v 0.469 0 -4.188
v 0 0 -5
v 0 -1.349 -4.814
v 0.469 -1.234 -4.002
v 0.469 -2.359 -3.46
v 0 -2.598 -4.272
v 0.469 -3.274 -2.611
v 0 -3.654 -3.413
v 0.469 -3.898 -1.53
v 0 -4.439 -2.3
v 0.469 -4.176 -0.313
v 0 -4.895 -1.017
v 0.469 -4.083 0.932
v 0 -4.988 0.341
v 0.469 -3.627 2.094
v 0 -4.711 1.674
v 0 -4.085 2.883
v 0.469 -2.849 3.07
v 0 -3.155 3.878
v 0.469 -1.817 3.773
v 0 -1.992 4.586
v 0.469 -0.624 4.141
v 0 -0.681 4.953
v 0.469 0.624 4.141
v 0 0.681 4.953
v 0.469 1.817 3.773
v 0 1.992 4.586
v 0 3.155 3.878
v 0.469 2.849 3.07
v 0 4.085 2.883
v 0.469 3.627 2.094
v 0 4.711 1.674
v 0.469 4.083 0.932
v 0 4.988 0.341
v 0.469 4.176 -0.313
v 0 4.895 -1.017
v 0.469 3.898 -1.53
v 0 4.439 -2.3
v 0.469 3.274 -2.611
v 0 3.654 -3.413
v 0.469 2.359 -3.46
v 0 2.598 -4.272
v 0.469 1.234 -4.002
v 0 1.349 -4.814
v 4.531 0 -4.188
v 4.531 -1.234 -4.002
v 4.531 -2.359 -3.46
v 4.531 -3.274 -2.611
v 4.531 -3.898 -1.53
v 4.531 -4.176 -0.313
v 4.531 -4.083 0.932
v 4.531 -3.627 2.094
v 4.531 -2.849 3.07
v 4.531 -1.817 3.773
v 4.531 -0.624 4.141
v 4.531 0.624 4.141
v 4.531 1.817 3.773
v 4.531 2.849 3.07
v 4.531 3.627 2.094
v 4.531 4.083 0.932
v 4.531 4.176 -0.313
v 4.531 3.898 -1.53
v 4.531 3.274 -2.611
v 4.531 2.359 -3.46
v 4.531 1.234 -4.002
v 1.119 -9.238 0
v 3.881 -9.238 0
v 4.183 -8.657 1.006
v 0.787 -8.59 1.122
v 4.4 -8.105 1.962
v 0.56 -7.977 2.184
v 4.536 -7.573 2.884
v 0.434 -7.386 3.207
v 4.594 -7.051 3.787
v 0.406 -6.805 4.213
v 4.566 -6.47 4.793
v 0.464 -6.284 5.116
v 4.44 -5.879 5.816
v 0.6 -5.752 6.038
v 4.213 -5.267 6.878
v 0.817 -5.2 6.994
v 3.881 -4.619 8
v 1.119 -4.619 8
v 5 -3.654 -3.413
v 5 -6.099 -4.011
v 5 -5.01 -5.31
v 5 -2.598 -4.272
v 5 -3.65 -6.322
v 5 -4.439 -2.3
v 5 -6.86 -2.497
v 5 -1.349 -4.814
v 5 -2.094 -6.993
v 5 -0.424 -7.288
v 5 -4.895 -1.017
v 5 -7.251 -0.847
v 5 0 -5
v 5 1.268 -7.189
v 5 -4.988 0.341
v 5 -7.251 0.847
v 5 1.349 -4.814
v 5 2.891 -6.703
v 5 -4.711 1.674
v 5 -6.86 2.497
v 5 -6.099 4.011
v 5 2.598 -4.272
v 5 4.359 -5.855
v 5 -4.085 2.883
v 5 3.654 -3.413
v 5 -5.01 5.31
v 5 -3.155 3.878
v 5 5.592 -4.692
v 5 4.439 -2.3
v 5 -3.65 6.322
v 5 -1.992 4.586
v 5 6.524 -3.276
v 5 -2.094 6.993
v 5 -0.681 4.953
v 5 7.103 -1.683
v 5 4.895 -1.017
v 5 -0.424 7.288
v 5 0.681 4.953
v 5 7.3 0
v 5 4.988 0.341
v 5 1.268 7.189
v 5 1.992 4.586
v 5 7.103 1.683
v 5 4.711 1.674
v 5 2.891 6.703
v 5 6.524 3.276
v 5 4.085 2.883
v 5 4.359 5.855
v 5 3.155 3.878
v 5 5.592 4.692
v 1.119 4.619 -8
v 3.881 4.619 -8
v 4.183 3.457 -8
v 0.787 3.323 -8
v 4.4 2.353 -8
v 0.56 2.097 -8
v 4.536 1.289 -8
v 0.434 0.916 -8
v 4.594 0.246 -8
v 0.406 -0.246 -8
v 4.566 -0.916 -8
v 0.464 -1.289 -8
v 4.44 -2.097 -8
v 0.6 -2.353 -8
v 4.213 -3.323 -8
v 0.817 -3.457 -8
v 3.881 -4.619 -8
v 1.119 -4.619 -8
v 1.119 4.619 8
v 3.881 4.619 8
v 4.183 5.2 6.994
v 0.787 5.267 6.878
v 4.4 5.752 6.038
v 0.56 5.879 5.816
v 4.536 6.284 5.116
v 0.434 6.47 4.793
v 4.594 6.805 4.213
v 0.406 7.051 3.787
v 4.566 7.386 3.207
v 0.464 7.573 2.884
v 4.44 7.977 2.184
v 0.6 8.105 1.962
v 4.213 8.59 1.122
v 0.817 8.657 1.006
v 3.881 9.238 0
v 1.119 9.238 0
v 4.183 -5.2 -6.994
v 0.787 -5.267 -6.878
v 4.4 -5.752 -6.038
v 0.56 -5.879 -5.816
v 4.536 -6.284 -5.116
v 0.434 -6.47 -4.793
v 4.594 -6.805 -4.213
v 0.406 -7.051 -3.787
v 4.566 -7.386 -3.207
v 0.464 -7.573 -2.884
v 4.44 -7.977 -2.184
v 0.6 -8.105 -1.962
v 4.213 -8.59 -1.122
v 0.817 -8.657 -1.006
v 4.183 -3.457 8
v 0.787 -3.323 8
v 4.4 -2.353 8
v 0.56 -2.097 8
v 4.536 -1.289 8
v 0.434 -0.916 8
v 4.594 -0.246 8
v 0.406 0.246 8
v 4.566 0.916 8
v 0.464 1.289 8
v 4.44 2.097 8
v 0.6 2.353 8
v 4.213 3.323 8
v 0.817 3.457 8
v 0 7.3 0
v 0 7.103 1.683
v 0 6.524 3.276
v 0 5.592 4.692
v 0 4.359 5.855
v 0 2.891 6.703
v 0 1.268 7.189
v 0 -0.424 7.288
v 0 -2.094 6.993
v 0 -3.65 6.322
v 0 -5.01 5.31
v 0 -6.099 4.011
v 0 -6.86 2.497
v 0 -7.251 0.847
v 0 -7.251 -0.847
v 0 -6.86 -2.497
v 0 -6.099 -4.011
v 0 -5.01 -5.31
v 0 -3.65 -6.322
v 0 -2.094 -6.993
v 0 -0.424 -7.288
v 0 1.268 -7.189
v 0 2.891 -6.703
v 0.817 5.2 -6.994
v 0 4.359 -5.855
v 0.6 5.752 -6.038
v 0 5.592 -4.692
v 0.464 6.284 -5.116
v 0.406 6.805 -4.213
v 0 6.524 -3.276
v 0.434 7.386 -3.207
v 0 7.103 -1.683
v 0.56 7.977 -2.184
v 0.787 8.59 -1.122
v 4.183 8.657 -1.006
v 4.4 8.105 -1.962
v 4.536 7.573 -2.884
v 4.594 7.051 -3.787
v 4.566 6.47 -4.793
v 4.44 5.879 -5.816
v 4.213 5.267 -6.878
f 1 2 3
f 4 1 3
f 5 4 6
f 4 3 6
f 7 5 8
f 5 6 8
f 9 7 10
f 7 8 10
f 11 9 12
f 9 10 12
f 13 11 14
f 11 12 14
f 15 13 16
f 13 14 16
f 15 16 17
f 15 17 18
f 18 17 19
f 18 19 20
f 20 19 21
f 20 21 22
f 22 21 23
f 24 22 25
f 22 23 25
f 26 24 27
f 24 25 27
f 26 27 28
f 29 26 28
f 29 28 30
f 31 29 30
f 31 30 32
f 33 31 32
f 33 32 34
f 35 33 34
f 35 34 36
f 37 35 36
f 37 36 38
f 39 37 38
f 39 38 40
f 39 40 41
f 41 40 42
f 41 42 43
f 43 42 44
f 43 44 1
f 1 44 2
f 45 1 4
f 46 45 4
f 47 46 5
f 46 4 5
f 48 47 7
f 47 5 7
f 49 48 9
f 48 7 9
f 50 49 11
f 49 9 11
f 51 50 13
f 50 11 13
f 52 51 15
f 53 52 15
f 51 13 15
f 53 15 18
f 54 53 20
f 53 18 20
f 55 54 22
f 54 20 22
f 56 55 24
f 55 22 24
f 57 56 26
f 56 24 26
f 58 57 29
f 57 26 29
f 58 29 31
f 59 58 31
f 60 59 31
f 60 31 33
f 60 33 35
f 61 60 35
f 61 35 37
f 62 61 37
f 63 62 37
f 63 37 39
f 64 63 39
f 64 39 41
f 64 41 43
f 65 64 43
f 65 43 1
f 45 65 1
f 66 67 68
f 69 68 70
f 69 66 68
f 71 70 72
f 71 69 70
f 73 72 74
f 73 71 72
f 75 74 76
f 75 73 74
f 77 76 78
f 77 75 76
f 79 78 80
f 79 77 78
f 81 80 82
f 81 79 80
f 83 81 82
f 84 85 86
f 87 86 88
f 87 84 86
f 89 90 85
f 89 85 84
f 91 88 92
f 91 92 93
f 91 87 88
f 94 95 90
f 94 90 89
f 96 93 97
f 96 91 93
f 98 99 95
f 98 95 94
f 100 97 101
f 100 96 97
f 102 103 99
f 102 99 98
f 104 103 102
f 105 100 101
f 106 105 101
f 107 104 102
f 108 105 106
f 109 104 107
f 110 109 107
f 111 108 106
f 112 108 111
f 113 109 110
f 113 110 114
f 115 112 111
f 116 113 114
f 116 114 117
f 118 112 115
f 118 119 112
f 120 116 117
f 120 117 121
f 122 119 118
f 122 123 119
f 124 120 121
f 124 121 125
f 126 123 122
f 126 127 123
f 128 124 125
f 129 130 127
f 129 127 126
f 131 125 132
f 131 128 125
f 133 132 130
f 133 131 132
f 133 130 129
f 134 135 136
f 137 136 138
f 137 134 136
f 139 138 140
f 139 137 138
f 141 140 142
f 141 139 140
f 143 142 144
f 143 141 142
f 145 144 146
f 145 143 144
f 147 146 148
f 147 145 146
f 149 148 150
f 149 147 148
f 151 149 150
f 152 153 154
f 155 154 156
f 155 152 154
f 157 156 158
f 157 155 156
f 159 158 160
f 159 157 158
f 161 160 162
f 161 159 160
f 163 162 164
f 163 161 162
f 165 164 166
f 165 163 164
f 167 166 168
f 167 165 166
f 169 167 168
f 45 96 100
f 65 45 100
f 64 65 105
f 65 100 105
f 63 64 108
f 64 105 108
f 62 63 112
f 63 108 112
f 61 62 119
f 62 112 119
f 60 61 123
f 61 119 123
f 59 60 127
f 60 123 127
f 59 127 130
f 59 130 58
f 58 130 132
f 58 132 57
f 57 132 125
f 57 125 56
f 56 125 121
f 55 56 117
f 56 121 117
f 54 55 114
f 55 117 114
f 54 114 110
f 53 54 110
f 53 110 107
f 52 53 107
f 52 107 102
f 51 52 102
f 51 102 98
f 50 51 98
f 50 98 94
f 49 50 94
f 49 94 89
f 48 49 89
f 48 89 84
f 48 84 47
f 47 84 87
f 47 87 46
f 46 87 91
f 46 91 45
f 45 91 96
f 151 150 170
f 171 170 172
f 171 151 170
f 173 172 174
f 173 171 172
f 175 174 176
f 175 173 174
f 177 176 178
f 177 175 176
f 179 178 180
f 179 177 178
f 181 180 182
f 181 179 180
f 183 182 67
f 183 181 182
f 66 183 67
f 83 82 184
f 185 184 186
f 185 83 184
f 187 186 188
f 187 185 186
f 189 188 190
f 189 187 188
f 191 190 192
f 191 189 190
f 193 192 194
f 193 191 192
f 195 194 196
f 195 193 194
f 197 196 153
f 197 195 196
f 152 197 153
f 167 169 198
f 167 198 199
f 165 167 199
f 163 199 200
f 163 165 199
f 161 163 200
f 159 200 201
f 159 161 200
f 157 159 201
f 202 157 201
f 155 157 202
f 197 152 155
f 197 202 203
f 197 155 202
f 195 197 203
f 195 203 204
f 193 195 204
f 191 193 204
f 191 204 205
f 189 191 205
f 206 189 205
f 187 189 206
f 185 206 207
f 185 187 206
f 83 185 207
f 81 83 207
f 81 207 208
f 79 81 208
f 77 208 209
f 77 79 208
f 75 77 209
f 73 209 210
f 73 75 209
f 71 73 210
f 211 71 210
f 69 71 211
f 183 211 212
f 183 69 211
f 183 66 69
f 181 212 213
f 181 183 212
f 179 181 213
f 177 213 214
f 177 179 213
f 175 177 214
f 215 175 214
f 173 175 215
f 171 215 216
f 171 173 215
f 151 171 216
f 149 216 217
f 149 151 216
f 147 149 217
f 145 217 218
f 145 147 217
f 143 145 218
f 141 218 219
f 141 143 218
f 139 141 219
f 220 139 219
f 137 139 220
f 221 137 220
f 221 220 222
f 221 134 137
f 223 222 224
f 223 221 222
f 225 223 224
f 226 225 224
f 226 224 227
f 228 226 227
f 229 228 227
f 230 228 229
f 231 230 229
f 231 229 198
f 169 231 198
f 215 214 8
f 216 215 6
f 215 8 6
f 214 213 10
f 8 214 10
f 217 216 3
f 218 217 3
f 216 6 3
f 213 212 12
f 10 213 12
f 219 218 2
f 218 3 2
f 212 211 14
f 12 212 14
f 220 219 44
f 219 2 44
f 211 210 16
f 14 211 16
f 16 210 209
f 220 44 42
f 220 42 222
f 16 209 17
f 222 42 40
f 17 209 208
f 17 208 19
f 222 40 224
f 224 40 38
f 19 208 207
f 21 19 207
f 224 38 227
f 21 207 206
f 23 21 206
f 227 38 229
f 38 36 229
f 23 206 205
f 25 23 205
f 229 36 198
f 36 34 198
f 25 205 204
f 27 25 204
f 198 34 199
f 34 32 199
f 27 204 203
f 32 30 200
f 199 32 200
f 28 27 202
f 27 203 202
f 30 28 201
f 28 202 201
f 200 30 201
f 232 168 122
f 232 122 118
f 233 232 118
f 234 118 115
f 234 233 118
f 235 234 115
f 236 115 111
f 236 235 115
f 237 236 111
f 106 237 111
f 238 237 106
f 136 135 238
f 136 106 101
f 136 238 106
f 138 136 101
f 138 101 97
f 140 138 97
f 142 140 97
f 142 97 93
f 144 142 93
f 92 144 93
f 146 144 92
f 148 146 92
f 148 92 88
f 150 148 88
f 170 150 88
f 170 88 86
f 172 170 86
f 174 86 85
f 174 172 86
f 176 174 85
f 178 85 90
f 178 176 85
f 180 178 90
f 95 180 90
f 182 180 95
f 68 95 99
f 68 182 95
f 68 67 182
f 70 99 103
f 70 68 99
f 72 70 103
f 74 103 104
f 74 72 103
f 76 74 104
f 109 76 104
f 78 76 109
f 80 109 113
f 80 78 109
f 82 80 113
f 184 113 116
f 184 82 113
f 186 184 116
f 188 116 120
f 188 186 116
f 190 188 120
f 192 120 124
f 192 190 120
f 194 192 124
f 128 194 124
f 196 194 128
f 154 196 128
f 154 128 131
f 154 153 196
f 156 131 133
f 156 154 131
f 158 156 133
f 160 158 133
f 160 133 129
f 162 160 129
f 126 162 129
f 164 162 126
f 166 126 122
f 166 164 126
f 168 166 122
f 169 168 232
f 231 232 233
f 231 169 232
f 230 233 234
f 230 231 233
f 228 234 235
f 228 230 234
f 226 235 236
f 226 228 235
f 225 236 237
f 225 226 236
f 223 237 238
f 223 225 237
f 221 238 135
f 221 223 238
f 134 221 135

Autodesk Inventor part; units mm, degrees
ref_plane "YZ Plane" through (0, 0, 0) normal (1, 0, 0) x (0, 1, 0)
ref_plane "XZ Plane" through (0, 0, 0) normal (0, 1, 0) x (-1, 0, 0)
sketch "Sketch1" plane through (0, 0, 0) normal (1, 0, 0) x (0, 1, 0)
  line L0 (-9.2376, 0) -> (-4.6188, 8)
  line L1 (-4.6188, 8) -> (4.6188, 8)
  line L2 (4.6188, 8) -> (9.2376, 0)
  line L3 (9.2376, 0) -> (4.6188, -8)
  line L4 (4.6188, -8) -> (-4.6188, -8)
  line L5 (-4.6188, -8) -> (-9.2376, 0)
  point P0 (0, 0)
  point P1 (0, 0)
  dimension "d0" = 18.4752
extrude "Body" add sketch "Sketch1" along normal blind 5
sketch "Sketch2" plane through (0, 0, 0) normal (0, 0, 1) x (1, 0, 0)
  line L0 (0, 4.6188) -> (0, 9.2376) projected
  line L1 (0, 9.2376) -> (5, 9.2376) projected
  line L2 (5, 4.6188) -> (5, 9.2376) projected
  line L3 (-1, 0) -> (6, 0) projected
  line L4 (1.1187, 9.2376) -> (0, 7.3)
  line L5 (3.8813, 9.2376) -> (5, 7.3)
  dimension "d3" = 30
  dimension "d4" = 30
  dimension "d5" = 14.6
  dimension "d6" = 14.6
revolve "Chamfer1" cut sketch "Sketch2" angle 360 about axis through (-10, 0, 0) along (1, 0, 0)
sketch "Sketch3" plane through (5, 0, 0) normal (1, 0, 0) x (0, 0, -1)
  arc A0 (-0.625, -1.0825) -> (0.625, -1.0825) centre (0, 0) ccw projected
hole "Thread" at (5, 0, 0) direction (-1, 0, 0) diameter 8.376 end through all thread size "M10x1.5" class "6H" standard "ISO Metric profile"
chamfer "Chamfer2" distance 0.8119 angle 30 1 edges at (5, 0, 4.188) measured on face at (5, 6.1818, -0.7506)
chamfer "Chamfer3" distance 0.8119 angle 30 1 edges at (0, 0, 4.188) measured on face at (0, 6.1818, -0.7506)
ref_plane "Work Plane1" through (-20.0362, 0, 0) normal (0, -0.866, -0.5) x (1, 0, 0)
equation "\"d0\" = 1.1547 * SW"
equation "\"d1\" = KOH"
equation "\"d3\" = ANG1"
equation "\"d4\" = ANG2"
equation "\"d5\" = SW0"
equation "\"d6\" = SW01"
equation "\"d8\" = -0.5 * GD1 + 0.5 * NND"
equation "\"d40\" = -0.5 * GD1 + 0.5 * NND"
equation "\"d10\" = -0.5 * GD1 + 0.5 * NND"
equation "\"d41\" = -0.5 * GD1 + 0.5 * NND"
equation "\"ANG1\" = 30deg"
equation "\"ANG2\" = 30deg"
equation "\"KOH\" = 5"
equation "\"SW\" = 16"
equation "\"SW0\" = 14.6"
equation "\"SW01\" = SW0"
equation "\"GUL\" = 0.541266 * PTC"
equation "\"TOA\" = 30deg"
equation "\"PTC\" = 1.5"
equation "\"E0\" = 1.155 * SW"
equation "\"GAL\" = 0.541266 * PTC"
equation "\"GD1\" = 8.376202"
equation "\"NND\" = 10"
properties part number "ISO 4035 - M10" material "Stainless Steel, 440C"
